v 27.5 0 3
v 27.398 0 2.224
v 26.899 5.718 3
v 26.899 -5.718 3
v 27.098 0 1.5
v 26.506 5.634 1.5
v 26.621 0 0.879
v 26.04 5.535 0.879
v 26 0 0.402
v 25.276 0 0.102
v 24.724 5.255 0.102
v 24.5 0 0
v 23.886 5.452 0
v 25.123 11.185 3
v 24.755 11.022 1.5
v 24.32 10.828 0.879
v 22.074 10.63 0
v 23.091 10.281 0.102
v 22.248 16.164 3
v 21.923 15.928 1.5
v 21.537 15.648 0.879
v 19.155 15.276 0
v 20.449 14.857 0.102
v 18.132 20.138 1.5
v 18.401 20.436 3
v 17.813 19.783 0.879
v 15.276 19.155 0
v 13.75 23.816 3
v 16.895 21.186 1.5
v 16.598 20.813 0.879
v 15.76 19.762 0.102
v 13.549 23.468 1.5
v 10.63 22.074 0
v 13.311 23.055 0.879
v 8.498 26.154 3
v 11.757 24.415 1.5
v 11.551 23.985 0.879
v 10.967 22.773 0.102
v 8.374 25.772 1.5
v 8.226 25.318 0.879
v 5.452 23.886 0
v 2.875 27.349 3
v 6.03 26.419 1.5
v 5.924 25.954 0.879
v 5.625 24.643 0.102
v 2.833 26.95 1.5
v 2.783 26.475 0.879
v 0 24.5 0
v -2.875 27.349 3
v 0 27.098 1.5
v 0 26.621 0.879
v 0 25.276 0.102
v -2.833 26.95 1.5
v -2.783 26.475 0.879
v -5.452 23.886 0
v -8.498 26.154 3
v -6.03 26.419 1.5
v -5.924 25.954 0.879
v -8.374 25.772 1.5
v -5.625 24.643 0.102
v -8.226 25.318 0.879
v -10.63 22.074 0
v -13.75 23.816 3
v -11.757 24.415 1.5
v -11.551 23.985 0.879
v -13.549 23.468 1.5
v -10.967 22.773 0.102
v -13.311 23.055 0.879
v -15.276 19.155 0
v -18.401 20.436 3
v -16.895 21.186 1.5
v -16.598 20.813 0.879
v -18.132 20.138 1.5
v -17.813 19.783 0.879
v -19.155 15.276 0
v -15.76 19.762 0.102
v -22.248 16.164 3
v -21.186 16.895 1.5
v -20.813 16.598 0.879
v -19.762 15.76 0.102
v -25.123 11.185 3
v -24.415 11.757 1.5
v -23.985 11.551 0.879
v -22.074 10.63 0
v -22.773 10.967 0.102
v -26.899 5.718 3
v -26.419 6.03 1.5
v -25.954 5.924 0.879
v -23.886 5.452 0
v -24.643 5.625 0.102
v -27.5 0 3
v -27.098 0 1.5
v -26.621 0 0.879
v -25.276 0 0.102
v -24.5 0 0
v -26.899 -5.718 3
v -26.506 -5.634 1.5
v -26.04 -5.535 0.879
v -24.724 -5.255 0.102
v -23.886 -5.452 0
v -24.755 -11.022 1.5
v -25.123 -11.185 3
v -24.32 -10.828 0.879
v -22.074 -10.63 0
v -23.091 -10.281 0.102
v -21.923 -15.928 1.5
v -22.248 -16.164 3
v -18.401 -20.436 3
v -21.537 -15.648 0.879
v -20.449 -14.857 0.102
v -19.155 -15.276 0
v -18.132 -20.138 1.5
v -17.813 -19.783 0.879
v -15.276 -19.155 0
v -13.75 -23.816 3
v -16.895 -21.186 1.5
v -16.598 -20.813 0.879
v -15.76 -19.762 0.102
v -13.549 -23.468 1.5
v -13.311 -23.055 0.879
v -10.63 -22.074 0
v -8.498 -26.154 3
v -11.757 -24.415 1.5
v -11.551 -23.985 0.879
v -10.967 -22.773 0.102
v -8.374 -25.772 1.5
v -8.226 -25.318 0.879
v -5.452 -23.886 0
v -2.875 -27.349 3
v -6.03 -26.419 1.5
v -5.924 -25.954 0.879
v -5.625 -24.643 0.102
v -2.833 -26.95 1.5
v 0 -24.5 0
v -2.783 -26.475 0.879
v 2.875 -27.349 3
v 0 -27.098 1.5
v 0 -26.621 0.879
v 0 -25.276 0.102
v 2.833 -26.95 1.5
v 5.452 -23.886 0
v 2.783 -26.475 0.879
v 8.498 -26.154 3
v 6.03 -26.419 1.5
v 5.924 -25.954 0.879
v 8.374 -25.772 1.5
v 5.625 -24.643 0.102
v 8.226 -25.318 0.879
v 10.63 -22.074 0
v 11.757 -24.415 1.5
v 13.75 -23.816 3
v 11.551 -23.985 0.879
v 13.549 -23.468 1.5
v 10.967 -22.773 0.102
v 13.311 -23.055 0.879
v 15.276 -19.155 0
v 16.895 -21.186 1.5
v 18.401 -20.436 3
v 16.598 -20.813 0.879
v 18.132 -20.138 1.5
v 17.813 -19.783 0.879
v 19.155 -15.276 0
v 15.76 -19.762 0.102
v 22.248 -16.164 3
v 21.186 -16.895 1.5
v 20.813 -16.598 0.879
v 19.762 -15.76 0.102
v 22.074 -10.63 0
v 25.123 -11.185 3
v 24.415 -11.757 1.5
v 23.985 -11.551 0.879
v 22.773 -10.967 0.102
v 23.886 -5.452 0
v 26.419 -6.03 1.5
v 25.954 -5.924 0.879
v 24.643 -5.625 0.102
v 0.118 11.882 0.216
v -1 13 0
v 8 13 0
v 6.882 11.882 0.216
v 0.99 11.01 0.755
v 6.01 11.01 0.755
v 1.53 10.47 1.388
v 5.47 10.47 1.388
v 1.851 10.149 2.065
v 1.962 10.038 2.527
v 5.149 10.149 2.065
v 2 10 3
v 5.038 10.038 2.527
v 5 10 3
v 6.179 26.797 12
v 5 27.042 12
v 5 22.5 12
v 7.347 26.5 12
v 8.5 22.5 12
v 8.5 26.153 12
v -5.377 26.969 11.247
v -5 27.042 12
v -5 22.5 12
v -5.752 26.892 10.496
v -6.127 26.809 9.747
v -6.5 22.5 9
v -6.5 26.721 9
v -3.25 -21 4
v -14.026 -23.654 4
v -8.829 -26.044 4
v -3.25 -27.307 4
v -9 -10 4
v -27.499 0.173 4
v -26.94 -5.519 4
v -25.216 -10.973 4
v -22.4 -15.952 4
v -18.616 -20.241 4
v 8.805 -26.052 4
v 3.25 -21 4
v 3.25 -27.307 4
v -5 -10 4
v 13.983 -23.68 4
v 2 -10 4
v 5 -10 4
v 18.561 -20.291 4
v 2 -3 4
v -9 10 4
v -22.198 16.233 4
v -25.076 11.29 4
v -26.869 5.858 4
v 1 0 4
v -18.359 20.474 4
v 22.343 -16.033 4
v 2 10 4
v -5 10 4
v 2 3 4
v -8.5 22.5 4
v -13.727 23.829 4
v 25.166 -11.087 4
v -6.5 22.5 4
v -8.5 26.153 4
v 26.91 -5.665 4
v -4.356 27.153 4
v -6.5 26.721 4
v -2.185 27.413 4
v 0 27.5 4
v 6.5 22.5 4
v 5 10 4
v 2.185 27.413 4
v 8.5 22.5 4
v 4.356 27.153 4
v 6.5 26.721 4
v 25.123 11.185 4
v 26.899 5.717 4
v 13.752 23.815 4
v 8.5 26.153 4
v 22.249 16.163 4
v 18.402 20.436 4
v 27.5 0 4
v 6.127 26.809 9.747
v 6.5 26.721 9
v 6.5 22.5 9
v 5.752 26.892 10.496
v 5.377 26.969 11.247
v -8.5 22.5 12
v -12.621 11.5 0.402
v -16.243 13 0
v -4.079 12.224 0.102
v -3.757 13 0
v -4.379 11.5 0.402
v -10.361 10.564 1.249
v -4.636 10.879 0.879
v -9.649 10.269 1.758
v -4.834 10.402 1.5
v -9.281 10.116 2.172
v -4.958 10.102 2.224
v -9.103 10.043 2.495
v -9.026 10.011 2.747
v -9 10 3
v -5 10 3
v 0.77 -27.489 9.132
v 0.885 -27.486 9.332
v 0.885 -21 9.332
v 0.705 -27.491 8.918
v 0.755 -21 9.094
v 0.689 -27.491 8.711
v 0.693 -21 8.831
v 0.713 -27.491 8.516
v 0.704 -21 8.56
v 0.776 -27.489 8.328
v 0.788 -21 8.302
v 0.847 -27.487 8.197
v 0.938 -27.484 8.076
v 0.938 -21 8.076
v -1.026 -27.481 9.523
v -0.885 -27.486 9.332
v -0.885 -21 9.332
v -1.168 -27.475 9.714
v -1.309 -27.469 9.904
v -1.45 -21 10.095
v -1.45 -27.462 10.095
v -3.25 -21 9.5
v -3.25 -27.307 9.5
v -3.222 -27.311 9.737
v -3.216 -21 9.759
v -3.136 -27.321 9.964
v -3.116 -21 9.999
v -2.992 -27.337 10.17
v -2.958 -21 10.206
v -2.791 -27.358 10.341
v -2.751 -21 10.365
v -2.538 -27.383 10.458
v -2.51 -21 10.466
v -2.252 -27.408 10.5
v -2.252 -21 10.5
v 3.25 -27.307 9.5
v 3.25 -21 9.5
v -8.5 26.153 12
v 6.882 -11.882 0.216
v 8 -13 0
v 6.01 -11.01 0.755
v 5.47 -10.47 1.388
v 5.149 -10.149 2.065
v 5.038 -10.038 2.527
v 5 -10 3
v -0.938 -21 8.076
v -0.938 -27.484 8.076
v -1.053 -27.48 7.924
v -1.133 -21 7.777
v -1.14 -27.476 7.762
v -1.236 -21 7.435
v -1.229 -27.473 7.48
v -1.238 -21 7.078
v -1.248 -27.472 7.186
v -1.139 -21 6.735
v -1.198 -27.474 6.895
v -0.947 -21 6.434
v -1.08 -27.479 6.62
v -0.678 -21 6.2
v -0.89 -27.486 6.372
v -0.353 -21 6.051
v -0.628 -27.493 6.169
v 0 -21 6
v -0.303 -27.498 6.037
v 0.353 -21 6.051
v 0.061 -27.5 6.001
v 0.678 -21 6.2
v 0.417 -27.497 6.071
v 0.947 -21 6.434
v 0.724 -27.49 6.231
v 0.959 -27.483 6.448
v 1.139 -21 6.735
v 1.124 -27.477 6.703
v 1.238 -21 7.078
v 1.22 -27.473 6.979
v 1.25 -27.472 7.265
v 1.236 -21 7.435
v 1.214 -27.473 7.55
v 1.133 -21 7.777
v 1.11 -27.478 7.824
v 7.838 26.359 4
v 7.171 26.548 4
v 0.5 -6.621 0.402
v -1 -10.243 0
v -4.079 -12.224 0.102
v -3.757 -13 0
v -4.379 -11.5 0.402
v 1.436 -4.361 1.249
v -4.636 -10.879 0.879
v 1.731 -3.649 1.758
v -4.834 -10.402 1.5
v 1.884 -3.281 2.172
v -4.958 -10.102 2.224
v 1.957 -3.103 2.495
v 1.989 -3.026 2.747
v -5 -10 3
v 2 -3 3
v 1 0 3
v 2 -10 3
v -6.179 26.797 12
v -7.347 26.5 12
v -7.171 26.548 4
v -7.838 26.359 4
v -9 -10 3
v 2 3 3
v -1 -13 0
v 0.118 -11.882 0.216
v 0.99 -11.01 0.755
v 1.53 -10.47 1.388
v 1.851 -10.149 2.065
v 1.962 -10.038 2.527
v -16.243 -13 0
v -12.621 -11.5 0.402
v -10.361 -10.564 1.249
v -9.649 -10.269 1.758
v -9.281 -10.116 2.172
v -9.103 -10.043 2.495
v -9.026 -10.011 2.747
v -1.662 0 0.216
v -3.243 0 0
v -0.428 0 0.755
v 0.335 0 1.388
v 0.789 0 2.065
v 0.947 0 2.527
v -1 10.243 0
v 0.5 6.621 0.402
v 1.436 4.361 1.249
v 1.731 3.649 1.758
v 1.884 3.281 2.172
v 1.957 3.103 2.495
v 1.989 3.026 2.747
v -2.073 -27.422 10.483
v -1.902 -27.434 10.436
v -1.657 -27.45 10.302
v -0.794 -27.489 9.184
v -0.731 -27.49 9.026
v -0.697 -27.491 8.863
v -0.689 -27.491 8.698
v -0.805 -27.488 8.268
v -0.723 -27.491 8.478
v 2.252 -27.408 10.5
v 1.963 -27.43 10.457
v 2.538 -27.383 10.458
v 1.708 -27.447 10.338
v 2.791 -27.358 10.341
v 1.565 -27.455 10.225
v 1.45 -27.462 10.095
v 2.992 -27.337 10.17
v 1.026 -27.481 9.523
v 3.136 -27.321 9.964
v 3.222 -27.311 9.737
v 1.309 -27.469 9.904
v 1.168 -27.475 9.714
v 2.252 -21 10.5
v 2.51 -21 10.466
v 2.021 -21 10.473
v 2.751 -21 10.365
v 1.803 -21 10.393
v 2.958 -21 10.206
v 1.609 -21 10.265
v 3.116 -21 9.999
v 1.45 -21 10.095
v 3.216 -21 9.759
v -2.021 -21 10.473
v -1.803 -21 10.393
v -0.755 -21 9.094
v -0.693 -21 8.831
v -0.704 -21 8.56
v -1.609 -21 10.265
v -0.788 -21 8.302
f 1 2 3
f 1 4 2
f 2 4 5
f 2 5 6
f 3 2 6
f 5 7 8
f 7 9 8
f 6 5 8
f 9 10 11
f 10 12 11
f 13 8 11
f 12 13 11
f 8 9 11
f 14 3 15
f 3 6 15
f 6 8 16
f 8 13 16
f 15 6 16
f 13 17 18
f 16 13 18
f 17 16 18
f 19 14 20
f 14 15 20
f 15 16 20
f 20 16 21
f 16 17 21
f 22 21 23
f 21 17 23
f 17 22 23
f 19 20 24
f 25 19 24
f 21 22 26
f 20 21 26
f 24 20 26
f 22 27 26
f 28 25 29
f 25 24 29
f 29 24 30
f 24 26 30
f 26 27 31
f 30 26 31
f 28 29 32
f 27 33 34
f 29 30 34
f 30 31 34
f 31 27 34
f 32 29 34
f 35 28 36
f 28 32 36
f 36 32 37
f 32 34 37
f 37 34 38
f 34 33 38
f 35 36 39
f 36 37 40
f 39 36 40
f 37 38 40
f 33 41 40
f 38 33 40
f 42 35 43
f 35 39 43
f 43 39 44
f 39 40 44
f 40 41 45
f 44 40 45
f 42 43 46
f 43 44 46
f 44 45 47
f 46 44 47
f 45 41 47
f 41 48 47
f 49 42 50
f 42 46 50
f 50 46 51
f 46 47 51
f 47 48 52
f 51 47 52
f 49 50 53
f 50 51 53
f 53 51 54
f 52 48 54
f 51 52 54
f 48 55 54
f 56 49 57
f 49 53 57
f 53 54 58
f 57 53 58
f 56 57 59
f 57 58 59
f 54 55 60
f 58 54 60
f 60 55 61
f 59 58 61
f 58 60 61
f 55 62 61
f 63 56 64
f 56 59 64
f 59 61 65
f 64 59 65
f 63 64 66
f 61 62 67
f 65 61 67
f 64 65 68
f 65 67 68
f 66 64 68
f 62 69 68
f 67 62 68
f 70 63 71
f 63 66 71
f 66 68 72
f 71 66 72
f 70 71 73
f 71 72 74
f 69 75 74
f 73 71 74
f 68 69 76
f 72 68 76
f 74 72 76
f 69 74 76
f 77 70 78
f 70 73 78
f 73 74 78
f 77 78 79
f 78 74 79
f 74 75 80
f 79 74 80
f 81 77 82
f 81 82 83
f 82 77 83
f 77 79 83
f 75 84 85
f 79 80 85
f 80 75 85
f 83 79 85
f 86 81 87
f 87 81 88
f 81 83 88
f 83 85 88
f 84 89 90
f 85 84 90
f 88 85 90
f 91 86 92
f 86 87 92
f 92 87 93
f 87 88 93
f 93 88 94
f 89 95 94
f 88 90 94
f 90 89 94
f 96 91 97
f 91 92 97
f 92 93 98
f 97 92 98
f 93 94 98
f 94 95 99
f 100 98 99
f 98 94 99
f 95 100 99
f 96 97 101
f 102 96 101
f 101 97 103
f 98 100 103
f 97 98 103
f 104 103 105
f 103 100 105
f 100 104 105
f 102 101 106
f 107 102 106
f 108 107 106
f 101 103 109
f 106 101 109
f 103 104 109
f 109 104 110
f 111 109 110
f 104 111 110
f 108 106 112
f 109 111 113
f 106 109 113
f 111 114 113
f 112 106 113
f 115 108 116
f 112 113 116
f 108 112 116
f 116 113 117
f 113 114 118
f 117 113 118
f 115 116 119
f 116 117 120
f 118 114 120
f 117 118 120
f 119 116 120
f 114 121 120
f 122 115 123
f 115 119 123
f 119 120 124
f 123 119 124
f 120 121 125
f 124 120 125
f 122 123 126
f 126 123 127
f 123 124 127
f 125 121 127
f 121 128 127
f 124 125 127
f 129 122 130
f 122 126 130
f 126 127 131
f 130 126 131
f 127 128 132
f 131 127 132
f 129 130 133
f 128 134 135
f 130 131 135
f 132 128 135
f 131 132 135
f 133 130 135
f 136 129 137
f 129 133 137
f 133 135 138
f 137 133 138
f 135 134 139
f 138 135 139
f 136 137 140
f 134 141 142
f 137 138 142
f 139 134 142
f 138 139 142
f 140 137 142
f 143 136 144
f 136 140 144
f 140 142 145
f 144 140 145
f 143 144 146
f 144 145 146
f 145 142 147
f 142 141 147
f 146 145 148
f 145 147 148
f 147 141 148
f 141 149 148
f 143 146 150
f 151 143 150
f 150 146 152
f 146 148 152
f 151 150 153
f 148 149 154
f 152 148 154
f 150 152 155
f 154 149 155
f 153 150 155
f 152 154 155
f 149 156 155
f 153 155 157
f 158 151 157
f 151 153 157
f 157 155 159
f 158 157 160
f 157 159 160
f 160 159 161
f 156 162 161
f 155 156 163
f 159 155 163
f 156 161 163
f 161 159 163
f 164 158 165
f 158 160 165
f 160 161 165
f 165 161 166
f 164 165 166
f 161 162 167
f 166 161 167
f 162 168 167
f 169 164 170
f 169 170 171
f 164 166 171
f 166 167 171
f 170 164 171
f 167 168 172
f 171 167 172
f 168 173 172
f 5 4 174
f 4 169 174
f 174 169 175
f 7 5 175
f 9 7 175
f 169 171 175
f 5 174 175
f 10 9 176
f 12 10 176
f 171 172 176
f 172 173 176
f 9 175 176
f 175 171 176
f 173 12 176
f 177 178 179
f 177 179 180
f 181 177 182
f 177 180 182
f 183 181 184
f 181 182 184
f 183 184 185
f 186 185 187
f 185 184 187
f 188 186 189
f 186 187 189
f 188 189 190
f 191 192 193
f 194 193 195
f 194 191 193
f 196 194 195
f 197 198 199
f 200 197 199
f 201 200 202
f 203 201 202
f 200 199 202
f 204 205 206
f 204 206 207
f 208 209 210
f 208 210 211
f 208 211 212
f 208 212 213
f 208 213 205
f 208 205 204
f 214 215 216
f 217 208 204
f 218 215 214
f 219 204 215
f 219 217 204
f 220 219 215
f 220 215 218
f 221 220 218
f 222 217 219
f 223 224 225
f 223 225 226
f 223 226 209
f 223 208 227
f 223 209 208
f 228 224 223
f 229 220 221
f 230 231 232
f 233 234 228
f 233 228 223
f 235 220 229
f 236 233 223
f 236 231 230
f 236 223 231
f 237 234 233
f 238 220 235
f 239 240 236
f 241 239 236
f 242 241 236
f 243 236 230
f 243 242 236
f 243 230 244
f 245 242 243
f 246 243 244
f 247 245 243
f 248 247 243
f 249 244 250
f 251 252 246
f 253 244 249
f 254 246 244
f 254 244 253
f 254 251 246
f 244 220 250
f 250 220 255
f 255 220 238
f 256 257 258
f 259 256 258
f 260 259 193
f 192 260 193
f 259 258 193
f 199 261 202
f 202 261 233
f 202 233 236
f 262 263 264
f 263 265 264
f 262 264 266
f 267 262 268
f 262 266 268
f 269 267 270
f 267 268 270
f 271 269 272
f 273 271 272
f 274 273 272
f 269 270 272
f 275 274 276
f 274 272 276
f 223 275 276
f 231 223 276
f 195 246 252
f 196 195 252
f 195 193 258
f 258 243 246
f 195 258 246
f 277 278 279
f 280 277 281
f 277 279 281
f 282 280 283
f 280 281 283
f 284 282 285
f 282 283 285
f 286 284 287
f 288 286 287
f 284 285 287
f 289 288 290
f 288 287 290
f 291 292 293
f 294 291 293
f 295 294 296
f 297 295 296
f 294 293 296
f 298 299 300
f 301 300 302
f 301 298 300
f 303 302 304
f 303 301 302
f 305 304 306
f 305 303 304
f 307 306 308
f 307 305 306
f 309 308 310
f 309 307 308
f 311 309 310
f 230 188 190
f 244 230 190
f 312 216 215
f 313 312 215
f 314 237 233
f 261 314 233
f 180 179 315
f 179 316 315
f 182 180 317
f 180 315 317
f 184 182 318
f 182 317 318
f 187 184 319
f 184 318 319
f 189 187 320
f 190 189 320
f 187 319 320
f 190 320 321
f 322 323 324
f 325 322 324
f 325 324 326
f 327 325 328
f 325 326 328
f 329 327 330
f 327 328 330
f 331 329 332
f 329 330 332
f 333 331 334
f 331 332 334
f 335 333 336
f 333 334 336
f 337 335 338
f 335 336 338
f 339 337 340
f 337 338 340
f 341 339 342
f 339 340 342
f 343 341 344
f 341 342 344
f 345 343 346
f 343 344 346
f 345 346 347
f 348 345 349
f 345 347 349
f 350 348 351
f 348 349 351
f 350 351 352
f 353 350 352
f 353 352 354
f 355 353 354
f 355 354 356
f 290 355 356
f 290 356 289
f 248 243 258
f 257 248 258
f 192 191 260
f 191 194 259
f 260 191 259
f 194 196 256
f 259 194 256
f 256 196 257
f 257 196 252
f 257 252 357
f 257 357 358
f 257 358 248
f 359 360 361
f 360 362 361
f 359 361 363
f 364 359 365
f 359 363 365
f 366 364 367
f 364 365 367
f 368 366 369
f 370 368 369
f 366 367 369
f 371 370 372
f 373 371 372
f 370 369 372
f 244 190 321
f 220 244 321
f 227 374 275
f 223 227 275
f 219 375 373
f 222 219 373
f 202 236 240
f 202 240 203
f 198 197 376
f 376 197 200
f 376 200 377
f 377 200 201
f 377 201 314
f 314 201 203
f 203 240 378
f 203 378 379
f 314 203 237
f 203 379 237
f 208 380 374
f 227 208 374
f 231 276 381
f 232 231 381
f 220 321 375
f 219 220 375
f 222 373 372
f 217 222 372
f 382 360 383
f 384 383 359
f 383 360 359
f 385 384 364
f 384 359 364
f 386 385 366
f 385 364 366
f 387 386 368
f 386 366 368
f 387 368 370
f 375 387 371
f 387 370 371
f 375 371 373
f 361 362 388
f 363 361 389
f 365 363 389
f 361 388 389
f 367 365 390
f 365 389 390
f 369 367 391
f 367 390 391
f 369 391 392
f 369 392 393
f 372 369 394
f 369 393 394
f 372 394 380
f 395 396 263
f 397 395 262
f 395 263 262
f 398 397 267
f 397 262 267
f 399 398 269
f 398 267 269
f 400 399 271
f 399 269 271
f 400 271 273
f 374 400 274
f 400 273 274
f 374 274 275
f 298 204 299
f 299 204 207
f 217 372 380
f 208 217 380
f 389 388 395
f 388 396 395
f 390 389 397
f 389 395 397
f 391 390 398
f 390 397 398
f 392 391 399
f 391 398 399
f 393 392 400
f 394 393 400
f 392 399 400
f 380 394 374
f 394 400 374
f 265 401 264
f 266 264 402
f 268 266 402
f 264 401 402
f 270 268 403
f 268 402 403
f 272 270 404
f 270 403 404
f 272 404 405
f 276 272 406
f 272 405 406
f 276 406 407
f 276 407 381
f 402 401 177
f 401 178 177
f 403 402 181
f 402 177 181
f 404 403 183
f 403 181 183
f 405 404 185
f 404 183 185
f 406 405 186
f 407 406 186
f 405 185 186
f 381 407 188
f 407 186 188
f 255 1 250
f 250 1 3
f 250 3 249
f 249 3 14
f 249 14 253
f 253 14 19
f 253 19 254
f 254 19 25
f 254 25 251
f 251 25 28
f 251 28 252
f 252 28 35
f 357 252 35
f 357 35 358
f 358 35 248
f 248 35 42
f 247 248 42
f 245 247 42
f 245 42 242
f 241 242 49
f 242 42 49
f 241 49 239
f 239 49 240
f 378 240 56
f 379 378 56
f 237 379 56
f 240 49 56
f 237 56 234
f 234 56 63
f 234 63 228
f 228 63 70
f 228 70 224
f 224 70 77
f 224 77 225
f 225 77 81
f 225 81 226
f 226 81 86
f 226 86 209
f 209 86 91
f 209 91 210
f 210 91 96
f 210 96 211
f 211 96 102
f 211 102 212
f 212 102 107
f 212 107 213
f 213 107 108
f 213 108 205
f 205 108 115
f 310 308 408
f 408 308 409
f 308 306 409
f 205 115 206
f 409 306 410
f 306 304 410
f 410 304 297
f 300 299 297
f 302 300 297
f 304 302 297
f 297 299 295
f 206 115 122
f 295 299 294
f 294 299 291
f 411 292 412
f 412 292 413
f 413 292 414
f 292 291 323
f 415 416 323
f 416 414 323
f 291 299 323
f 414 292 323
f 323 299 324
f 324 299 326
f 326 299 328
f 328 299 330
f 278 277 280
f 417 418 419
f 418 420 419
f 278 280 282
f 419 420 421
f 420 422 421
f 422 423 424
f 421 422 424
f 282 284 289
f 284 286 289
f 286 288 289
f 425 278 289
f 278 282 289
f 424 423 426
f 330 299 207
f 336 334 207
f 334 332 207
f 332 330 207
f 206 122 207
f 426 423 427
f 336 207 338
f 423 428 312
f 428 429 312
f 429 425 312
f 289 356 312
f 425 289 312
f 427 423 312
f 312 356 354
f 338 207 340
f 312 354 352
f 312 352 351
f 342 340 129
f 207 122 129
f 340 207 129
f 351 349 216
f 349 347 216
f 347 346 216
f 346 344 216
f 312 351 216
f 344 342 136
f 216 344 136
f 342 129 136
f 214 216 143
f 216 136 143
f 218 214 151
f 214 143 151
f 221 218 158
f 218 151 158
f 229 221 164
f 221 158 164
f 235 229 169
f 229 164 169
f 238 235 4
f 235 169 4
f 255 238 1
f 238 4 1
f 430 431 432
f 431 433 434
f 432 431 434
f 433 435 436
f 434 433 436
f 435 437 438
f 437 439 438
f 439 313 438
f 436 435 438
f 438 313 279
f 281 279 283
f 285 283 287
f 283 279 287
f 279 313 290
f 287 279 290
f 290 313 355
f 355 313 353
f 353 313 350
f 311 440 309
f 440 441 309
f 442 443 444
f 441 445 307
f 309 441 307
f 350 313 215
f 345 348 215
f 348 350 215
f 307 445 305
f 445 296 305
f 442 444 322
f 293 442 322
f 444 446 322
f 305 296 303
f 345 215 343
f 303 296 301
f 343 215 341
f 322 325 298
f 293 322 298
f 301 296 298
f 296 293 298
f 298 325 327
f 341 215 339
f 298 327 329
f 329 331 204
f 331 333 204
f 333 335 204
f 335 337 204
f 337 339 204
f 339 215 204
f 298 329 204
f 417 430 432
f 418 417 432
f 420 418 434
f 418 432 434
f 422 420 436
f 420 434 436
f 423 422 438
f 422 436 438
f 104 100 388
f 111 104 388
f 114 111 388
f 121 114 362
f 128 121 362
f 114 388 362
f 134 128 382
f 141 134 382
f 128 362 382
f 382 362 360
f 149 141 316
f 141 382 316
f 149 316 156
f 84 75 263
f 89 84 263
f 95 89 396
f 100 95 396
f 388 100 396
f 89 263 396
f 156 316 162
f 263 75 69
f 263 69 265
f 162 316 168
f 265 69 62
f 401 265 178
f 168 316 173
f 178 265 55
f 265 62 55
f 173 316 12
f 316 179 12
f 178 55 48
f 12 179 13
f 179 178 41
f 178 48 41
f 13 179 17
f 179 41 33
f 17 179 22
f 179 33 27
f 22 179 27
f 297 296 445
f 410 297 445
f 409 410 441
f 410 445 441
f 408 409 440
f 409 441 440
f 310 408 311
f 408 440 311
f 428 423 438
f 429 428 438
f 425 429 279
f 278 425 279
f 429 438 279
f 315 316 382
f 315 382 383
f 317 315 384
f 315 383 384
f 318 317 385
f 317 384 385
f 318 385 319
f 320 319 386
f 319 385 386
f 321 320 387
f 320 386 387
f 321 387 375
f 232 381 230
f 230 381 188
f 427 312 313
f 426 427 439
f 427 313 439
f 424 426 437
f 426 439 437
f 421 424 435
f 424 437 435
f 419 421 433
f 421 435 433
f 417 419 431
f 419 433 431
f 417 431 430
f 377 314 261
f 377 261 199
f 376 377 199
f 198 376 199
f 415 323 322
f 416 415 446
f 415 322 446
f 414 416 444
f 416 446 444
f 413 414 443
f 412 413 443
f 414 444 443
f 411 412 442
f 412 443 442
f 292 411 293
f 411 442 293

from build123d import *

# Parameters (mm, degrees)
F0_R         = 27.5
F1_DEPTH     = 4
F3_DEPTH     = 8
F4_W         = 13
F4_H         = 5
F5_DEPTH     = 25
F6_W         = 10
F6_H         = 3
F7_DEPTH     = 25
F9_DEPTH     = 25
F11_DEPTH    = 25
F13_DEPTH    = 6.5
F15_D        = 2.5
F17_DEPTH    = 25
F18_T1_DEPTH = 11.8336321238
F19_T1_DEPTH = 11.3072792493
F19_T3_DEPTH = 8.9630793076
F21_DEPTH    = 25
F22_R        = 3


# Not quite as in the source:
# - a fillet or chamfer that OpenCascade refuses, or shapes differently, is made with other operations: its cross-section is extruded or revolved along the edge and cut away or added


with BuildPart() as f1:
    # F0 (on Top) → F1 (new body)
    with BuildSketch(Plane.XY):
        Circle(F0_R)
    extrude(amount=F1_DEPTH)

    # F2 (on face) → F3 (join)
    with BuildSketch(Plane.XY.offset(4)):
        with BuildLine():
            ThreePointArc((8.5, 26.1533936612), (4.3030033163, 27.1612621662), (9e-08, 27.5))
            ThreePointArc((9e-08, 27.5), (-4.3030032274, 27.1612621803), (-8.5, 26.1533936612))
            Line((-8.5, 26.1533936612), (-8.5, 22.5))
            Line((-8.5, 22.5), (8.5, 22.5))
            Line((8.5, 22.5), (8.5, 26.1533936612))
        make_face()
    extrude(amount=F3_DEPTH)

    # F4 (on face) → F5 (cut)
    with BuildSketch(Plane.XZ.offset(-22.5)):
        with Locations((0, 6.5)):
            Rectangle(F4_W, F4_H)
    extrude(amount=-F5_DEPTH, mode=Mode.SUBTRACT)

    # F6 (on face) → F7 (cut)
    with BuildSketch(Plane.XZ.offset(-22.5)):
        with Locations((0, 10.5)):
            Rectangle(F6_W, F6_H)
    extrude(amount=-F7_DEPTH, mode=Mode.SUBTRACT)

    # F8 (on face) → F9 (cut)
    with BuildSketch(Plane.XZ.offset(-22.5)):
        Polygon((-5, 12), (-6.5, 9), (-5, 9), align=None)
    extrude(amount=-F9_DEPTH, mode=Mode.SUBTRACT)

    # F10 (on face) → F11 (cut)
    with BuildSketch(Plane.XZ.offset(-22.5)):
        Polygon((5, 9), (6.5, 9), (5, 12), align=None)
    extrude(amount=-F11_DEPTH, mode=Mode.SUBTRACT)

    # F12 (on face) → F13 (join)
    with BuildSketch(Plane.XY.offset(4)):
        with BuildLine():
            Line((3.25, -27.3072792493), (3.25, -21))
            Line((3.25, -21), (-3.25, -21))
            Line((-3.25, -21), (-3.25, -27.3072792493))
            ThreePointArc((-3.25, -27.3072792493), (-1.627854515, -27.4517775322), (0, -27.5))
            ThreePointArc((0, -27.5), (1.627854515, -27.4517775322), (3.25, -27.3072792493))
        make_face()
    extrude(amount=F13_DEPTH)

    # F15 (through all)
    with Locations(Plane(origin=(0, -21, 0), x_dir=(-1, 0, 0), z_dir=(0, 1, 0))):
        with Locations((0, 7.25)):
            Hole(F15_D / 2)

    # F16 (on face) → F17 (cut)
    with BuildSketch(Plane(origin=(0, -21, 0), x_dir=(-1, 0, 0), z_dir=(0, 1, 0))):
        with BuildLine():
            Line((-1.75, 10.5), (-0.25, 8.4747448714))
            ThreePointArc((-0.25, 8.4747448714), (0, 8.5), (0.25, 8.4747448714))
            Line((0.25, 8.4747448714), (1.75, 10.5))
            Line((1.75, 10.5), (-1.75, 10.5))
        make_face()
    extrude(amount=-F17_DEPTH, mode=Mode.SUBTRACT)

    # F18: fillet of radius 1 on 2 edges, made by hand

    # F18_s2 → F18_t1 (cut)
    with BuildSketch(Plane.XZ.offset(18.3326157402)):
        with BuildLine():
            ThreePointArc((0.8850285779, 9.3321414608), (0.6895138592, 8.6947290379), (0.9381231309, 8.0760901835))
            ThreePointArc((0.9381231309, 8.0760901835), (0.6266103523, 8.331600419), (0.25, 8.4747448714))
            Line((0.25, 8.4747448714), (0.8850285779, 9.3321414608))
        make_face()
        with BuildLine():
            ThreePointArc((-0.9381231309, 8.0760901835), (-0.6895138592, 8.6947290379), (-0.8850285779, 9.3321414608))
            Line((-0.8850285779, 9.3321414608), (-0.25, 8.4747448714))
            ThreePointArc((-0.25, 8.4747448714), (-0.6266103523, 8.331600419), (-0.9381231309, 8.0760901835))
        make_face()
    extrude(amount=F18_T1_DEPTH, mode=Mode.SUBTRACT)

    # F19: fillet of radius 1 on 4 edges, made by hand

    # F19_s2 → F19_t1 (cut)
    with BuildSketch(Plane.XZ.offset(18.5)):
        with BuildLine():
            ThreePointArc((3.25, 9.5), (2.9571067812, 10.2071067812), (2.25, 10.5))
            Line((2.25, 10.5), (3.25, 10.5))
            Line((3.25, 10.5), (3.25, 9.5))
        make_face()
        with BuildLine():
            ThreePointArc((-3.25, 9.5), (-2.9571067812, 10.2071067812), (-2.25, 10.5))
            Line((-2.25, 10.5), (-3.25, 10.5))
            Line((-3.25, 10.5), (-3.25, 9.5))
        make_face()
    extrude(amount=F19_T1_DEPTH, mode=Mode.SUBTRACT)

    # F19_s4 → F19_t3 (cut)
    with BuildSketch(Plane.XZ.offset(19.7405911939)):
        with BuildLine():
            ThreePointArc((2.2537635225, 10.5), (1.8038630505, 10.3930787005), (1.4501704647, 10.0951791306))
            Line((1.4501704647, 10.0951791306), (1.75, 10.5))
            Line((1.75, 10.5), (2.2537635225, 10.5))
        make_face()
        with BuildLine():
            ThreePointArc((-1.4501704647, 10.0951791306), (-1.8038630505, 10.3930787005), (-2.2537635225, 10.5))
            Line((-2.2537635225, 10.5), (-1.75, 10.5))
            Line((-1.75, 10.5), (-1.4501704647, 10.0951791306))
        make_face()
    extrude(amount=F19_T3_DEPTH, mode=Mode.SUBTRACT)

    # F20 (on face) → F21 (cut)
    with BuildSketch(Plane(origin=(0, 0, 0), x_dir=(1, 0, 0), z_dir=(0, 0, -1))):
        Polygon((2, -10), (5, -10), (5, 10), (2, 10), (2, 3), (-5, 10), (-9, 10), (1, 0), (-9, -10), (-5, -10), (2, -3), align=None)
    extrude(amount=-F21_DEPTH, mode=Mode.SUBTRACT)

    # F22
    f22_edges = [f1.edges().sort_by_distance(p)[0] for p in [
        (-27.5, 0, 0),
        (-1.5, 6.5, 0),
        (-7, 10, 0),
        (-4, 5, 0),
        (-4, -5, 0),
        (-7, -10, 0),
        (-1.5, -6.5, 0),
        (2, -6.5, 0),
        (3.5, -10, 0),
        (5, 0, 0),
        (3.5, 10, 0),
        (2, 6.5, 0),
    ]]
    fillet(f22_edges, radius=F22_R)


solid = f1.part
